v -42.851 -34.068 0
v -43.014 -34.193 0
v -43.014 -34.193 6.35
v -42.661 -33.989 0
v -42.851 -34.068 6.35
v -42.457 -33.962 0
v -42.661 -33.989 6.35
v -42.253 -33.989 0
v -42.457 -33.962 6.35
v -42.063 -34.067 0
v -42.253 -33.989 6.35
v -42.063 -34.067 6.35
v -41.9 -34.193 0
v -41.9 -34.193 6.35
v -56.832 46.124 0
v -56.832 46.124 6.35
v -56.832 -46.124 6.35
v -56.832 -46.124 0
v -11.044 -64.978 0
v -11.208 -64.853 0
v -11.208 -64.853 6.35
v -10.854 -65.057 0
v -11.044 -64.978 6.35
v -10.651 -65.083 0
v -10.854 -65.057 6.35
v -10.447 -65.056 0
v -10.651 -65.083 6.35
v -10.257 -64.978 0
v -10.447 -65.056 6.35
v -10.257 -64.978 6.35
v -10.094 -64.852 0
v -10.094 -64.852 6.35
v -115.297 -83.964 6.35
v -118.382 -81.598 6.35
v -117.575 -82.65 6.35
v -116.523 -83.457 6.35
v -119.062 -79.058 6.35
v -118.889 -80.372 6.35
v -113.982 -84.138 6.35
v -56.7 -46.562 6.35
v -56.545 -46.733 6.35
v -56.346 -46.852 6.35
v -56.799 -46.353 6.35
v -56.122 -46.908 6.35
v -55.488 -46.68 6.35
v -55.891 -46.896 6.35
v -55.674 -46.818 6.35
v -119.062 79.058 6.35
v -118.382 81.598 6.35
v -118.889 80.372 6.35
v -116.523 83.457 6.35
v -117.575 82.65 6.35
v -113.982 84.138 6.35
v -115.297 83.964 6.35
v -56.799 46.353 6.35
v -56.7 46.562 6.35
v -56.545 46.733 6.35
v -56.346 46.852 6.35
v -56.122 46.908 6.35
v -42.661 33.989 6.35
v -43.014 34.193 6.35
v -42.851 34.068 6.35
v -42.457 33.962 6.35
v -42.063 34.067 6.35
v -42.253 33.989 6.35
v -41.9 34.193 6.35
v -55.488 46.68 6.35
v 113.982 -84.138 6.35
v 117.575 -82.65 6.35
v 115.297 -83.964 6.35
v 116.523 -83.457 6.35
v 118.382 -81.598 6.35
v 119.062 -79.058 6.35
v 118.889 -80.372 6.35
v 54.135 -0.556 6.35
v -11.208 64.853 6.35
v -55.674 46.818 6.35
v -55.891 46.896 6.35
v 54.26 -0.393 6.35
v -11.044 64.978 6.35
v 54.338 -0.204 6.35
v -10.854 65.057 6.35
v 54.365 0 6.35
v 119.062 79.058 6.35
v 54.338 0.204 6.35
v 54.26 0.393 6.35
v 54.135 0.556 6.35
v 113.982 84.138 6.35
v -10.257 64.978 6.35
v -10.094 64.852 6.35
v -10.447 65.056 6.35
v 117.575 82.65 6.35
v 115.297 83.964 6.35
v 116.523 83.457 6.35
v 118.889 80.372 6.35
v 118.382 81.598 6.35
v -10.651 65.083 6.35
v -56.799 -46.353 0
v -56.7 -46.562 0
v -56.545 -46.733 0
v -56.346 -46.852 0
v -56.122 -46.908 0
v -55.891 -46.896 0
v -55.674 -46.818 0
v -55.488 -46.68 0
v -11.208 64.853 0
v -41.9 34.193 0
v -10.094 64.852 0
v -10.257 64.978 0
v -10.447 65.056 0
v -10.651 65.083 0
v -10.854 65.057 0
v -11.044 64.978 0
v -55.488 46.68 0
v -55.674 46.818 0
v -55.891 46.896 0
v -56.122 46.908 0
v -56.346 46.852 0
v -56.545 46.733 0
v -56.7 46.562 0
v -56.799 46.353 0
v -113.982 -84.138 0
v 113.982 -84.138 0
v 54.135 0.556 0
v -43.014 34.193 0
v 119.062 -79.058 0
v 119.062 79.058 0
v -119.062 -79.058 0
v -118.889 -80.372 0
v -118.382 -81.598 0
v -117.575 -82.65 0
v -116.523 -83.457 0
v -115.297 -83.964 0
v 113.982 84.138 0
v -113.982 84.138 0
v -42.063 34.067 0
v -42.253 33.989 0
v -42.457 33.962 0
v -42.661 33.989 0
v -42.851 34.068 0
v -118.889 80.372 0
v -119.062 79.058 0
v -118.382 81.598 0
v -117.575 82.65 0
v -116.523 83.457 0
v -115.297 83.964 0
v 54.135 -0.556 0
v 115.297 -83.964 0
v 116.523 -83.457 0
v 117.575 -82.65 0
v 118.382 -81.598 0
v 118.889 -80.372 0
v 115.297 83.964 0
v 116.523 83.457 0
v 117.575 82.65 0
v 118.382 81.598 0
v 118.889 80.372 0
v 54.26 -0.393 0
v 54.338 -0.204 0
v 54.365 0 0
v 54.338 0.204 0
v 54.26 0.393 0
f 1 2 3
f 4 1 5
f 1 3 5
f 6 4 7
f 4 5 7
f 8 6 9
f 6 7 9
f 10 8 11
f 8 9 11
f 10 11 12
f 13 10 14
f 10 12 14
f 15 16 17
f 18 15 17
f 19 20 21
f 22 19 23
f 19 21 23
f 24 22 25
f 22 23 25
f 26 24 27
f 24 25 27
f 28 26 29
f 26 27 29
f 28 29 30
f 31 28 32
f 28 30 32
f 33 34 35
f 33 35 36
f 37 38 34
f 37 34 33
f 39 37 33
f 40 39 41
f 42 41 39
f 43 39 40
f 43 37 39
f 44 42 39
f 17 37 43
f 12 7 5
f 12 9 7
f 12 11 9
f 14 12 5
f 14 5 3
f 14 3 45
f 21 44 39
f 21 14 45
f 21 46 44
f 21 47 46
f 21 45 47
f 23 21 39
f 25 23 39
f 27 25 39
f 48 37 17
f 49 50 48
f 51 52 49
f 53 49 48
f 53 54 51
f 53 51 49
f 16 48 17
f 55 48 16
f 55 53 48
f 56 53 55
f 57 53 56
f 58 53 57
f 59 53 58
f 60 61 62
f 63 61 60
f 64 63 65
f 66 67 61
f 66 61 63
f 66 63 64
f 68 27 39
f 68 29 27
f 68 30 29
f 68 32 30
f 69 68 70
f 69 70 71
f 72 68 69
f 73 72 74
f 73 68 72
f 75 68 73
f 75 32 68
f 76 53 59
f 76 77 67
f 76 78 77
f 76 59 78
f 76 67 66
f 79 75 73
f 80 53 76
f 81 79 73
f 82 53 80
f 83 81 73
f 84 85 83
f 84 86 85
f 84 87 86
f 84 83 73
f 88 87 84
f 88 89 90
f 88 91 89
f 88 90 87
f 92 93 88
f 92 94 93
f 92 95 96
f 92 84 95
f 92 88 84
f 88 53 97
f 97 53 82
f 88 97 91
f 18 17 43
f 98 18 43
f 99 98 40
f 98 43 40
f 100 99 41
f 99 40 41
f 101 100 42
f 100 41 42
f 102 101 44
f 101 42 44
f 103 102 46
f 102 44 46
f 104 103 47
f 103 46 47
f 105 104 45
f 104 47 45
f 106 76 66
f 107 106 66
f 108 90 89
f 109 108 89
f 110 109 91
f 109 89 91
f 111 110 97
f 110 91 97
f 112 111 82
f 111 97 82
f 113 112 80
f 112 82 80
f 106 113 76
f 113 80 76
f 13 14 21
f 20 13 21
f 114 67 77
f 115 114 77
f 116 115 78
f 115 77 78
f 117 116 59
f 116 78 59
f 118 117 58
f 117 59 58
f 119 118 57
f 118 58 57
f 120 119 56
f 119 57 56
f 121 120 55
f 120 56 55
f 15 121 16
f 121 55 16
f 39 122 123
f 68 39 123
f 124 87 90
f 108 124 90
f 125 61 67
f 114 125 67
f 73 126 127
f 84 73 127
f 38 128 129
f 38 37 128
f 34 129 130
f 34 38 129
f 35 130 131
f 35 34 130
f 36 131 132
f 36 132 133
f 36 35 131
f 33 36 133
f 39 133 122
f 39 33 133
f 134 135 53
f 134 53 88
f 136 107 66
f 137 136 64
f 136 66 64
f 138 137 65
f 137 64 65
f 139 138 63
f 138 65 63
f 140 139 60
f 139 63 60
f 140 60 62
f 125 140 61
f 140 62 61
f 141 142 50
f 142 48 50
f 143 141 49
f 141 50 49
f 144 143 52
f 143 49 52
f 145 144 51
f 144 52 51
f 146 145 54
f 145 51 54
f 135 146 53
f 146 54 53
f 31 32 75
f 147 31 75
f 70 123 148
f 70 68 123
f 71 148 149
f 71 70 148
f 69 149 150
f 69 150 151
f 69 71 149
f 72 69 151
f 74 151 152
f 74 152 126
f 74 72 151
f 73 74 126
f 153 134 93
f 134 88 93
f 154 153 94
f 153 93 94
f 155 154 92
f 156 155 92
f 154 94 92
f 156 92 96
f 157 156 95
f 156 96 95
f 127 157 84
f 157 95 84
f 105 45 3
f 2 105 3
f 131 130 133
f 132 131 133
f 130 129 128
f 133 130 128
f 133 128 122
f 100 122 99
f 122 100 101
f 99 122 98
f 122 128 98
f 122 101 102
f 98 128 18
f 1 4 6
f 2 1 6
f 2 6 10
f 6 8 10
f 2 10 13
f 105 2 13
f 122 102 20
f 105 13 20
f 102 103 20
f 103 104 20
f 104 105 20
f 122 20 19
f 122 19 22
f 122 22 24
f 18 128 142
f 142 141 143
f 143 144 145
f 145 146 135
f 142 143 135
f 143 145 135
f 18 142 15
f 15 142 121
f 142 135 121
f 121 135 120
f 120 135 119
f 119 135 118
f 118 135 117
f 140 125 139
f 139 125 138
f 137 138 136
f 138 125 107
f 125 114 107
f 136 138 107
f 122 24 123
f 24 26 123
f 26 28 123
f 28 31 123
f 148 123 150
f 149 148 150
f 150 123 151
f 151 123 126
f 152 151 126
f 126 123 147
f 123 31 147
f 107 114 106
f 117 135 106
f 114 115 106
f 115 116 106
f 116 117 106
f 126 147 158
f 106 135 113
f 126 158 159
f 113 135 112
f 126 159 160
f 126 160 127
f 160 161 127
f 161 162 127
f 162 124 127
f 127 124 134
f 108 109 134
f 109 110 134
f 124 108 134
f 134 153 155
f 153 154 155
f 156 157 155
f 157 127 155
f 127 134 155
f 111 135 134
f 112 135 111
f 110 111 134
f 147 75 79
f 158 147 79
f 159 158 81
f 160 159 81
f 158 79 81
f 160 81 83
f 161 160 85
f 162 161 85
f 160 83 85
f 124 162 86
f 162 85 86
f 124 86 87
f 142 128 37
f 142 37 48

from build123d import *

# Parameters (mm, degrees)
F0_W     = 238.125
F0_H     = 168.275
F1_DEPTH = 6.35
F3_DEPTH = 25.4
F4_R     = 5.08
F6_DEPTH = 6.351


with BuildPart() as f1:
    # F0 (on Top) → F1 (new body)
    with BuildSketch(Plane.XY):
        Rectangle(F0_W, F0_H)
    extrude(amount=F1_DEPTH)

    # F2 (on face) → F3 (cut)
    with BuildSketch(Plane.XY.offset(6.35)):
        Polygon((-42.458184, 31.839972), (-55.5625, 44.958), (-55.5625, 0), (-55.5625, -44.958), (-42.458184, -31.839972), (-10.651458, -63.613451), (52.8955, 0), (-10.651458, 63.613451), align=None)
    extrude(amount=-F3_DEPTH, mode=Mode.SUBTRACT)

    # F4
    f4_edges = [f1.edges().sort_by_distance(p)[0] for p in [
        (119.0625, -84.1375, 3.175),
        (119.0625, 84.1375, 3.175),
        (-119.0625, -84.1375, 3.175),
        (-119.0625, 84.1375, 3.175),
    ]]
    fillet(f4_edges, radius=F4_R)

    # F5 (on face) → F6 (cut, through all)
    with BuildSketch(Plane.XY.offset(6.35)):
        with BuildLine():
            Line((-43.013729, 34.19309), (-55.488033, 46.680446))
            ThreePointArc((-55.488033, 46.680446), (-56.346235, 46.851503), (-56.8325, 46.123962))
            Line((-56.8325, 46.123962), (-56.8325, -46.123962))
            ThreePointArc((-56.8325, -46.123962), (-56.346235, -46.851503), (-55.488033, -46.680446))
            Line((-55.488033, -46.680446), (-43.013729, -34.19309))
            ThreePointArc((-43.013729, -34.19309), (-42.457074, -33.962175), (-41.900178, -34.192508))
            Line((-41.900178, -34.192508), (-11.207586, -64.853017))
            ThreePointArc((-11.207586, -64.853017), (-10.65069, -65.08335), (-10.094034, -64.852435))
            Line((-10.094034, -64.852435), (54.13471, -0.556485))
            ThreePointArc((54.13471, -0.556485), (54.365043, 0), (54.13471, 0.556485))
            Line((54.13471, 0.556485), (-10.094034, 64.852435))
            ThreePointArc((-10.094034, 64.852435), (-10.65069, 65.08335), (-11.207586, 64.853017))
            Line((-11.207586, 64.853017), (-41.900178, 34.192508))
            ThreePointArc((-41.900178, 34.192508), (-42.457074, 33.962175), (-43.013729, 34.19309))
        make_face()
    extrude(amount=-F6_DEPTH, mode=Mode.SUBTRACT)


solid = f1.part
